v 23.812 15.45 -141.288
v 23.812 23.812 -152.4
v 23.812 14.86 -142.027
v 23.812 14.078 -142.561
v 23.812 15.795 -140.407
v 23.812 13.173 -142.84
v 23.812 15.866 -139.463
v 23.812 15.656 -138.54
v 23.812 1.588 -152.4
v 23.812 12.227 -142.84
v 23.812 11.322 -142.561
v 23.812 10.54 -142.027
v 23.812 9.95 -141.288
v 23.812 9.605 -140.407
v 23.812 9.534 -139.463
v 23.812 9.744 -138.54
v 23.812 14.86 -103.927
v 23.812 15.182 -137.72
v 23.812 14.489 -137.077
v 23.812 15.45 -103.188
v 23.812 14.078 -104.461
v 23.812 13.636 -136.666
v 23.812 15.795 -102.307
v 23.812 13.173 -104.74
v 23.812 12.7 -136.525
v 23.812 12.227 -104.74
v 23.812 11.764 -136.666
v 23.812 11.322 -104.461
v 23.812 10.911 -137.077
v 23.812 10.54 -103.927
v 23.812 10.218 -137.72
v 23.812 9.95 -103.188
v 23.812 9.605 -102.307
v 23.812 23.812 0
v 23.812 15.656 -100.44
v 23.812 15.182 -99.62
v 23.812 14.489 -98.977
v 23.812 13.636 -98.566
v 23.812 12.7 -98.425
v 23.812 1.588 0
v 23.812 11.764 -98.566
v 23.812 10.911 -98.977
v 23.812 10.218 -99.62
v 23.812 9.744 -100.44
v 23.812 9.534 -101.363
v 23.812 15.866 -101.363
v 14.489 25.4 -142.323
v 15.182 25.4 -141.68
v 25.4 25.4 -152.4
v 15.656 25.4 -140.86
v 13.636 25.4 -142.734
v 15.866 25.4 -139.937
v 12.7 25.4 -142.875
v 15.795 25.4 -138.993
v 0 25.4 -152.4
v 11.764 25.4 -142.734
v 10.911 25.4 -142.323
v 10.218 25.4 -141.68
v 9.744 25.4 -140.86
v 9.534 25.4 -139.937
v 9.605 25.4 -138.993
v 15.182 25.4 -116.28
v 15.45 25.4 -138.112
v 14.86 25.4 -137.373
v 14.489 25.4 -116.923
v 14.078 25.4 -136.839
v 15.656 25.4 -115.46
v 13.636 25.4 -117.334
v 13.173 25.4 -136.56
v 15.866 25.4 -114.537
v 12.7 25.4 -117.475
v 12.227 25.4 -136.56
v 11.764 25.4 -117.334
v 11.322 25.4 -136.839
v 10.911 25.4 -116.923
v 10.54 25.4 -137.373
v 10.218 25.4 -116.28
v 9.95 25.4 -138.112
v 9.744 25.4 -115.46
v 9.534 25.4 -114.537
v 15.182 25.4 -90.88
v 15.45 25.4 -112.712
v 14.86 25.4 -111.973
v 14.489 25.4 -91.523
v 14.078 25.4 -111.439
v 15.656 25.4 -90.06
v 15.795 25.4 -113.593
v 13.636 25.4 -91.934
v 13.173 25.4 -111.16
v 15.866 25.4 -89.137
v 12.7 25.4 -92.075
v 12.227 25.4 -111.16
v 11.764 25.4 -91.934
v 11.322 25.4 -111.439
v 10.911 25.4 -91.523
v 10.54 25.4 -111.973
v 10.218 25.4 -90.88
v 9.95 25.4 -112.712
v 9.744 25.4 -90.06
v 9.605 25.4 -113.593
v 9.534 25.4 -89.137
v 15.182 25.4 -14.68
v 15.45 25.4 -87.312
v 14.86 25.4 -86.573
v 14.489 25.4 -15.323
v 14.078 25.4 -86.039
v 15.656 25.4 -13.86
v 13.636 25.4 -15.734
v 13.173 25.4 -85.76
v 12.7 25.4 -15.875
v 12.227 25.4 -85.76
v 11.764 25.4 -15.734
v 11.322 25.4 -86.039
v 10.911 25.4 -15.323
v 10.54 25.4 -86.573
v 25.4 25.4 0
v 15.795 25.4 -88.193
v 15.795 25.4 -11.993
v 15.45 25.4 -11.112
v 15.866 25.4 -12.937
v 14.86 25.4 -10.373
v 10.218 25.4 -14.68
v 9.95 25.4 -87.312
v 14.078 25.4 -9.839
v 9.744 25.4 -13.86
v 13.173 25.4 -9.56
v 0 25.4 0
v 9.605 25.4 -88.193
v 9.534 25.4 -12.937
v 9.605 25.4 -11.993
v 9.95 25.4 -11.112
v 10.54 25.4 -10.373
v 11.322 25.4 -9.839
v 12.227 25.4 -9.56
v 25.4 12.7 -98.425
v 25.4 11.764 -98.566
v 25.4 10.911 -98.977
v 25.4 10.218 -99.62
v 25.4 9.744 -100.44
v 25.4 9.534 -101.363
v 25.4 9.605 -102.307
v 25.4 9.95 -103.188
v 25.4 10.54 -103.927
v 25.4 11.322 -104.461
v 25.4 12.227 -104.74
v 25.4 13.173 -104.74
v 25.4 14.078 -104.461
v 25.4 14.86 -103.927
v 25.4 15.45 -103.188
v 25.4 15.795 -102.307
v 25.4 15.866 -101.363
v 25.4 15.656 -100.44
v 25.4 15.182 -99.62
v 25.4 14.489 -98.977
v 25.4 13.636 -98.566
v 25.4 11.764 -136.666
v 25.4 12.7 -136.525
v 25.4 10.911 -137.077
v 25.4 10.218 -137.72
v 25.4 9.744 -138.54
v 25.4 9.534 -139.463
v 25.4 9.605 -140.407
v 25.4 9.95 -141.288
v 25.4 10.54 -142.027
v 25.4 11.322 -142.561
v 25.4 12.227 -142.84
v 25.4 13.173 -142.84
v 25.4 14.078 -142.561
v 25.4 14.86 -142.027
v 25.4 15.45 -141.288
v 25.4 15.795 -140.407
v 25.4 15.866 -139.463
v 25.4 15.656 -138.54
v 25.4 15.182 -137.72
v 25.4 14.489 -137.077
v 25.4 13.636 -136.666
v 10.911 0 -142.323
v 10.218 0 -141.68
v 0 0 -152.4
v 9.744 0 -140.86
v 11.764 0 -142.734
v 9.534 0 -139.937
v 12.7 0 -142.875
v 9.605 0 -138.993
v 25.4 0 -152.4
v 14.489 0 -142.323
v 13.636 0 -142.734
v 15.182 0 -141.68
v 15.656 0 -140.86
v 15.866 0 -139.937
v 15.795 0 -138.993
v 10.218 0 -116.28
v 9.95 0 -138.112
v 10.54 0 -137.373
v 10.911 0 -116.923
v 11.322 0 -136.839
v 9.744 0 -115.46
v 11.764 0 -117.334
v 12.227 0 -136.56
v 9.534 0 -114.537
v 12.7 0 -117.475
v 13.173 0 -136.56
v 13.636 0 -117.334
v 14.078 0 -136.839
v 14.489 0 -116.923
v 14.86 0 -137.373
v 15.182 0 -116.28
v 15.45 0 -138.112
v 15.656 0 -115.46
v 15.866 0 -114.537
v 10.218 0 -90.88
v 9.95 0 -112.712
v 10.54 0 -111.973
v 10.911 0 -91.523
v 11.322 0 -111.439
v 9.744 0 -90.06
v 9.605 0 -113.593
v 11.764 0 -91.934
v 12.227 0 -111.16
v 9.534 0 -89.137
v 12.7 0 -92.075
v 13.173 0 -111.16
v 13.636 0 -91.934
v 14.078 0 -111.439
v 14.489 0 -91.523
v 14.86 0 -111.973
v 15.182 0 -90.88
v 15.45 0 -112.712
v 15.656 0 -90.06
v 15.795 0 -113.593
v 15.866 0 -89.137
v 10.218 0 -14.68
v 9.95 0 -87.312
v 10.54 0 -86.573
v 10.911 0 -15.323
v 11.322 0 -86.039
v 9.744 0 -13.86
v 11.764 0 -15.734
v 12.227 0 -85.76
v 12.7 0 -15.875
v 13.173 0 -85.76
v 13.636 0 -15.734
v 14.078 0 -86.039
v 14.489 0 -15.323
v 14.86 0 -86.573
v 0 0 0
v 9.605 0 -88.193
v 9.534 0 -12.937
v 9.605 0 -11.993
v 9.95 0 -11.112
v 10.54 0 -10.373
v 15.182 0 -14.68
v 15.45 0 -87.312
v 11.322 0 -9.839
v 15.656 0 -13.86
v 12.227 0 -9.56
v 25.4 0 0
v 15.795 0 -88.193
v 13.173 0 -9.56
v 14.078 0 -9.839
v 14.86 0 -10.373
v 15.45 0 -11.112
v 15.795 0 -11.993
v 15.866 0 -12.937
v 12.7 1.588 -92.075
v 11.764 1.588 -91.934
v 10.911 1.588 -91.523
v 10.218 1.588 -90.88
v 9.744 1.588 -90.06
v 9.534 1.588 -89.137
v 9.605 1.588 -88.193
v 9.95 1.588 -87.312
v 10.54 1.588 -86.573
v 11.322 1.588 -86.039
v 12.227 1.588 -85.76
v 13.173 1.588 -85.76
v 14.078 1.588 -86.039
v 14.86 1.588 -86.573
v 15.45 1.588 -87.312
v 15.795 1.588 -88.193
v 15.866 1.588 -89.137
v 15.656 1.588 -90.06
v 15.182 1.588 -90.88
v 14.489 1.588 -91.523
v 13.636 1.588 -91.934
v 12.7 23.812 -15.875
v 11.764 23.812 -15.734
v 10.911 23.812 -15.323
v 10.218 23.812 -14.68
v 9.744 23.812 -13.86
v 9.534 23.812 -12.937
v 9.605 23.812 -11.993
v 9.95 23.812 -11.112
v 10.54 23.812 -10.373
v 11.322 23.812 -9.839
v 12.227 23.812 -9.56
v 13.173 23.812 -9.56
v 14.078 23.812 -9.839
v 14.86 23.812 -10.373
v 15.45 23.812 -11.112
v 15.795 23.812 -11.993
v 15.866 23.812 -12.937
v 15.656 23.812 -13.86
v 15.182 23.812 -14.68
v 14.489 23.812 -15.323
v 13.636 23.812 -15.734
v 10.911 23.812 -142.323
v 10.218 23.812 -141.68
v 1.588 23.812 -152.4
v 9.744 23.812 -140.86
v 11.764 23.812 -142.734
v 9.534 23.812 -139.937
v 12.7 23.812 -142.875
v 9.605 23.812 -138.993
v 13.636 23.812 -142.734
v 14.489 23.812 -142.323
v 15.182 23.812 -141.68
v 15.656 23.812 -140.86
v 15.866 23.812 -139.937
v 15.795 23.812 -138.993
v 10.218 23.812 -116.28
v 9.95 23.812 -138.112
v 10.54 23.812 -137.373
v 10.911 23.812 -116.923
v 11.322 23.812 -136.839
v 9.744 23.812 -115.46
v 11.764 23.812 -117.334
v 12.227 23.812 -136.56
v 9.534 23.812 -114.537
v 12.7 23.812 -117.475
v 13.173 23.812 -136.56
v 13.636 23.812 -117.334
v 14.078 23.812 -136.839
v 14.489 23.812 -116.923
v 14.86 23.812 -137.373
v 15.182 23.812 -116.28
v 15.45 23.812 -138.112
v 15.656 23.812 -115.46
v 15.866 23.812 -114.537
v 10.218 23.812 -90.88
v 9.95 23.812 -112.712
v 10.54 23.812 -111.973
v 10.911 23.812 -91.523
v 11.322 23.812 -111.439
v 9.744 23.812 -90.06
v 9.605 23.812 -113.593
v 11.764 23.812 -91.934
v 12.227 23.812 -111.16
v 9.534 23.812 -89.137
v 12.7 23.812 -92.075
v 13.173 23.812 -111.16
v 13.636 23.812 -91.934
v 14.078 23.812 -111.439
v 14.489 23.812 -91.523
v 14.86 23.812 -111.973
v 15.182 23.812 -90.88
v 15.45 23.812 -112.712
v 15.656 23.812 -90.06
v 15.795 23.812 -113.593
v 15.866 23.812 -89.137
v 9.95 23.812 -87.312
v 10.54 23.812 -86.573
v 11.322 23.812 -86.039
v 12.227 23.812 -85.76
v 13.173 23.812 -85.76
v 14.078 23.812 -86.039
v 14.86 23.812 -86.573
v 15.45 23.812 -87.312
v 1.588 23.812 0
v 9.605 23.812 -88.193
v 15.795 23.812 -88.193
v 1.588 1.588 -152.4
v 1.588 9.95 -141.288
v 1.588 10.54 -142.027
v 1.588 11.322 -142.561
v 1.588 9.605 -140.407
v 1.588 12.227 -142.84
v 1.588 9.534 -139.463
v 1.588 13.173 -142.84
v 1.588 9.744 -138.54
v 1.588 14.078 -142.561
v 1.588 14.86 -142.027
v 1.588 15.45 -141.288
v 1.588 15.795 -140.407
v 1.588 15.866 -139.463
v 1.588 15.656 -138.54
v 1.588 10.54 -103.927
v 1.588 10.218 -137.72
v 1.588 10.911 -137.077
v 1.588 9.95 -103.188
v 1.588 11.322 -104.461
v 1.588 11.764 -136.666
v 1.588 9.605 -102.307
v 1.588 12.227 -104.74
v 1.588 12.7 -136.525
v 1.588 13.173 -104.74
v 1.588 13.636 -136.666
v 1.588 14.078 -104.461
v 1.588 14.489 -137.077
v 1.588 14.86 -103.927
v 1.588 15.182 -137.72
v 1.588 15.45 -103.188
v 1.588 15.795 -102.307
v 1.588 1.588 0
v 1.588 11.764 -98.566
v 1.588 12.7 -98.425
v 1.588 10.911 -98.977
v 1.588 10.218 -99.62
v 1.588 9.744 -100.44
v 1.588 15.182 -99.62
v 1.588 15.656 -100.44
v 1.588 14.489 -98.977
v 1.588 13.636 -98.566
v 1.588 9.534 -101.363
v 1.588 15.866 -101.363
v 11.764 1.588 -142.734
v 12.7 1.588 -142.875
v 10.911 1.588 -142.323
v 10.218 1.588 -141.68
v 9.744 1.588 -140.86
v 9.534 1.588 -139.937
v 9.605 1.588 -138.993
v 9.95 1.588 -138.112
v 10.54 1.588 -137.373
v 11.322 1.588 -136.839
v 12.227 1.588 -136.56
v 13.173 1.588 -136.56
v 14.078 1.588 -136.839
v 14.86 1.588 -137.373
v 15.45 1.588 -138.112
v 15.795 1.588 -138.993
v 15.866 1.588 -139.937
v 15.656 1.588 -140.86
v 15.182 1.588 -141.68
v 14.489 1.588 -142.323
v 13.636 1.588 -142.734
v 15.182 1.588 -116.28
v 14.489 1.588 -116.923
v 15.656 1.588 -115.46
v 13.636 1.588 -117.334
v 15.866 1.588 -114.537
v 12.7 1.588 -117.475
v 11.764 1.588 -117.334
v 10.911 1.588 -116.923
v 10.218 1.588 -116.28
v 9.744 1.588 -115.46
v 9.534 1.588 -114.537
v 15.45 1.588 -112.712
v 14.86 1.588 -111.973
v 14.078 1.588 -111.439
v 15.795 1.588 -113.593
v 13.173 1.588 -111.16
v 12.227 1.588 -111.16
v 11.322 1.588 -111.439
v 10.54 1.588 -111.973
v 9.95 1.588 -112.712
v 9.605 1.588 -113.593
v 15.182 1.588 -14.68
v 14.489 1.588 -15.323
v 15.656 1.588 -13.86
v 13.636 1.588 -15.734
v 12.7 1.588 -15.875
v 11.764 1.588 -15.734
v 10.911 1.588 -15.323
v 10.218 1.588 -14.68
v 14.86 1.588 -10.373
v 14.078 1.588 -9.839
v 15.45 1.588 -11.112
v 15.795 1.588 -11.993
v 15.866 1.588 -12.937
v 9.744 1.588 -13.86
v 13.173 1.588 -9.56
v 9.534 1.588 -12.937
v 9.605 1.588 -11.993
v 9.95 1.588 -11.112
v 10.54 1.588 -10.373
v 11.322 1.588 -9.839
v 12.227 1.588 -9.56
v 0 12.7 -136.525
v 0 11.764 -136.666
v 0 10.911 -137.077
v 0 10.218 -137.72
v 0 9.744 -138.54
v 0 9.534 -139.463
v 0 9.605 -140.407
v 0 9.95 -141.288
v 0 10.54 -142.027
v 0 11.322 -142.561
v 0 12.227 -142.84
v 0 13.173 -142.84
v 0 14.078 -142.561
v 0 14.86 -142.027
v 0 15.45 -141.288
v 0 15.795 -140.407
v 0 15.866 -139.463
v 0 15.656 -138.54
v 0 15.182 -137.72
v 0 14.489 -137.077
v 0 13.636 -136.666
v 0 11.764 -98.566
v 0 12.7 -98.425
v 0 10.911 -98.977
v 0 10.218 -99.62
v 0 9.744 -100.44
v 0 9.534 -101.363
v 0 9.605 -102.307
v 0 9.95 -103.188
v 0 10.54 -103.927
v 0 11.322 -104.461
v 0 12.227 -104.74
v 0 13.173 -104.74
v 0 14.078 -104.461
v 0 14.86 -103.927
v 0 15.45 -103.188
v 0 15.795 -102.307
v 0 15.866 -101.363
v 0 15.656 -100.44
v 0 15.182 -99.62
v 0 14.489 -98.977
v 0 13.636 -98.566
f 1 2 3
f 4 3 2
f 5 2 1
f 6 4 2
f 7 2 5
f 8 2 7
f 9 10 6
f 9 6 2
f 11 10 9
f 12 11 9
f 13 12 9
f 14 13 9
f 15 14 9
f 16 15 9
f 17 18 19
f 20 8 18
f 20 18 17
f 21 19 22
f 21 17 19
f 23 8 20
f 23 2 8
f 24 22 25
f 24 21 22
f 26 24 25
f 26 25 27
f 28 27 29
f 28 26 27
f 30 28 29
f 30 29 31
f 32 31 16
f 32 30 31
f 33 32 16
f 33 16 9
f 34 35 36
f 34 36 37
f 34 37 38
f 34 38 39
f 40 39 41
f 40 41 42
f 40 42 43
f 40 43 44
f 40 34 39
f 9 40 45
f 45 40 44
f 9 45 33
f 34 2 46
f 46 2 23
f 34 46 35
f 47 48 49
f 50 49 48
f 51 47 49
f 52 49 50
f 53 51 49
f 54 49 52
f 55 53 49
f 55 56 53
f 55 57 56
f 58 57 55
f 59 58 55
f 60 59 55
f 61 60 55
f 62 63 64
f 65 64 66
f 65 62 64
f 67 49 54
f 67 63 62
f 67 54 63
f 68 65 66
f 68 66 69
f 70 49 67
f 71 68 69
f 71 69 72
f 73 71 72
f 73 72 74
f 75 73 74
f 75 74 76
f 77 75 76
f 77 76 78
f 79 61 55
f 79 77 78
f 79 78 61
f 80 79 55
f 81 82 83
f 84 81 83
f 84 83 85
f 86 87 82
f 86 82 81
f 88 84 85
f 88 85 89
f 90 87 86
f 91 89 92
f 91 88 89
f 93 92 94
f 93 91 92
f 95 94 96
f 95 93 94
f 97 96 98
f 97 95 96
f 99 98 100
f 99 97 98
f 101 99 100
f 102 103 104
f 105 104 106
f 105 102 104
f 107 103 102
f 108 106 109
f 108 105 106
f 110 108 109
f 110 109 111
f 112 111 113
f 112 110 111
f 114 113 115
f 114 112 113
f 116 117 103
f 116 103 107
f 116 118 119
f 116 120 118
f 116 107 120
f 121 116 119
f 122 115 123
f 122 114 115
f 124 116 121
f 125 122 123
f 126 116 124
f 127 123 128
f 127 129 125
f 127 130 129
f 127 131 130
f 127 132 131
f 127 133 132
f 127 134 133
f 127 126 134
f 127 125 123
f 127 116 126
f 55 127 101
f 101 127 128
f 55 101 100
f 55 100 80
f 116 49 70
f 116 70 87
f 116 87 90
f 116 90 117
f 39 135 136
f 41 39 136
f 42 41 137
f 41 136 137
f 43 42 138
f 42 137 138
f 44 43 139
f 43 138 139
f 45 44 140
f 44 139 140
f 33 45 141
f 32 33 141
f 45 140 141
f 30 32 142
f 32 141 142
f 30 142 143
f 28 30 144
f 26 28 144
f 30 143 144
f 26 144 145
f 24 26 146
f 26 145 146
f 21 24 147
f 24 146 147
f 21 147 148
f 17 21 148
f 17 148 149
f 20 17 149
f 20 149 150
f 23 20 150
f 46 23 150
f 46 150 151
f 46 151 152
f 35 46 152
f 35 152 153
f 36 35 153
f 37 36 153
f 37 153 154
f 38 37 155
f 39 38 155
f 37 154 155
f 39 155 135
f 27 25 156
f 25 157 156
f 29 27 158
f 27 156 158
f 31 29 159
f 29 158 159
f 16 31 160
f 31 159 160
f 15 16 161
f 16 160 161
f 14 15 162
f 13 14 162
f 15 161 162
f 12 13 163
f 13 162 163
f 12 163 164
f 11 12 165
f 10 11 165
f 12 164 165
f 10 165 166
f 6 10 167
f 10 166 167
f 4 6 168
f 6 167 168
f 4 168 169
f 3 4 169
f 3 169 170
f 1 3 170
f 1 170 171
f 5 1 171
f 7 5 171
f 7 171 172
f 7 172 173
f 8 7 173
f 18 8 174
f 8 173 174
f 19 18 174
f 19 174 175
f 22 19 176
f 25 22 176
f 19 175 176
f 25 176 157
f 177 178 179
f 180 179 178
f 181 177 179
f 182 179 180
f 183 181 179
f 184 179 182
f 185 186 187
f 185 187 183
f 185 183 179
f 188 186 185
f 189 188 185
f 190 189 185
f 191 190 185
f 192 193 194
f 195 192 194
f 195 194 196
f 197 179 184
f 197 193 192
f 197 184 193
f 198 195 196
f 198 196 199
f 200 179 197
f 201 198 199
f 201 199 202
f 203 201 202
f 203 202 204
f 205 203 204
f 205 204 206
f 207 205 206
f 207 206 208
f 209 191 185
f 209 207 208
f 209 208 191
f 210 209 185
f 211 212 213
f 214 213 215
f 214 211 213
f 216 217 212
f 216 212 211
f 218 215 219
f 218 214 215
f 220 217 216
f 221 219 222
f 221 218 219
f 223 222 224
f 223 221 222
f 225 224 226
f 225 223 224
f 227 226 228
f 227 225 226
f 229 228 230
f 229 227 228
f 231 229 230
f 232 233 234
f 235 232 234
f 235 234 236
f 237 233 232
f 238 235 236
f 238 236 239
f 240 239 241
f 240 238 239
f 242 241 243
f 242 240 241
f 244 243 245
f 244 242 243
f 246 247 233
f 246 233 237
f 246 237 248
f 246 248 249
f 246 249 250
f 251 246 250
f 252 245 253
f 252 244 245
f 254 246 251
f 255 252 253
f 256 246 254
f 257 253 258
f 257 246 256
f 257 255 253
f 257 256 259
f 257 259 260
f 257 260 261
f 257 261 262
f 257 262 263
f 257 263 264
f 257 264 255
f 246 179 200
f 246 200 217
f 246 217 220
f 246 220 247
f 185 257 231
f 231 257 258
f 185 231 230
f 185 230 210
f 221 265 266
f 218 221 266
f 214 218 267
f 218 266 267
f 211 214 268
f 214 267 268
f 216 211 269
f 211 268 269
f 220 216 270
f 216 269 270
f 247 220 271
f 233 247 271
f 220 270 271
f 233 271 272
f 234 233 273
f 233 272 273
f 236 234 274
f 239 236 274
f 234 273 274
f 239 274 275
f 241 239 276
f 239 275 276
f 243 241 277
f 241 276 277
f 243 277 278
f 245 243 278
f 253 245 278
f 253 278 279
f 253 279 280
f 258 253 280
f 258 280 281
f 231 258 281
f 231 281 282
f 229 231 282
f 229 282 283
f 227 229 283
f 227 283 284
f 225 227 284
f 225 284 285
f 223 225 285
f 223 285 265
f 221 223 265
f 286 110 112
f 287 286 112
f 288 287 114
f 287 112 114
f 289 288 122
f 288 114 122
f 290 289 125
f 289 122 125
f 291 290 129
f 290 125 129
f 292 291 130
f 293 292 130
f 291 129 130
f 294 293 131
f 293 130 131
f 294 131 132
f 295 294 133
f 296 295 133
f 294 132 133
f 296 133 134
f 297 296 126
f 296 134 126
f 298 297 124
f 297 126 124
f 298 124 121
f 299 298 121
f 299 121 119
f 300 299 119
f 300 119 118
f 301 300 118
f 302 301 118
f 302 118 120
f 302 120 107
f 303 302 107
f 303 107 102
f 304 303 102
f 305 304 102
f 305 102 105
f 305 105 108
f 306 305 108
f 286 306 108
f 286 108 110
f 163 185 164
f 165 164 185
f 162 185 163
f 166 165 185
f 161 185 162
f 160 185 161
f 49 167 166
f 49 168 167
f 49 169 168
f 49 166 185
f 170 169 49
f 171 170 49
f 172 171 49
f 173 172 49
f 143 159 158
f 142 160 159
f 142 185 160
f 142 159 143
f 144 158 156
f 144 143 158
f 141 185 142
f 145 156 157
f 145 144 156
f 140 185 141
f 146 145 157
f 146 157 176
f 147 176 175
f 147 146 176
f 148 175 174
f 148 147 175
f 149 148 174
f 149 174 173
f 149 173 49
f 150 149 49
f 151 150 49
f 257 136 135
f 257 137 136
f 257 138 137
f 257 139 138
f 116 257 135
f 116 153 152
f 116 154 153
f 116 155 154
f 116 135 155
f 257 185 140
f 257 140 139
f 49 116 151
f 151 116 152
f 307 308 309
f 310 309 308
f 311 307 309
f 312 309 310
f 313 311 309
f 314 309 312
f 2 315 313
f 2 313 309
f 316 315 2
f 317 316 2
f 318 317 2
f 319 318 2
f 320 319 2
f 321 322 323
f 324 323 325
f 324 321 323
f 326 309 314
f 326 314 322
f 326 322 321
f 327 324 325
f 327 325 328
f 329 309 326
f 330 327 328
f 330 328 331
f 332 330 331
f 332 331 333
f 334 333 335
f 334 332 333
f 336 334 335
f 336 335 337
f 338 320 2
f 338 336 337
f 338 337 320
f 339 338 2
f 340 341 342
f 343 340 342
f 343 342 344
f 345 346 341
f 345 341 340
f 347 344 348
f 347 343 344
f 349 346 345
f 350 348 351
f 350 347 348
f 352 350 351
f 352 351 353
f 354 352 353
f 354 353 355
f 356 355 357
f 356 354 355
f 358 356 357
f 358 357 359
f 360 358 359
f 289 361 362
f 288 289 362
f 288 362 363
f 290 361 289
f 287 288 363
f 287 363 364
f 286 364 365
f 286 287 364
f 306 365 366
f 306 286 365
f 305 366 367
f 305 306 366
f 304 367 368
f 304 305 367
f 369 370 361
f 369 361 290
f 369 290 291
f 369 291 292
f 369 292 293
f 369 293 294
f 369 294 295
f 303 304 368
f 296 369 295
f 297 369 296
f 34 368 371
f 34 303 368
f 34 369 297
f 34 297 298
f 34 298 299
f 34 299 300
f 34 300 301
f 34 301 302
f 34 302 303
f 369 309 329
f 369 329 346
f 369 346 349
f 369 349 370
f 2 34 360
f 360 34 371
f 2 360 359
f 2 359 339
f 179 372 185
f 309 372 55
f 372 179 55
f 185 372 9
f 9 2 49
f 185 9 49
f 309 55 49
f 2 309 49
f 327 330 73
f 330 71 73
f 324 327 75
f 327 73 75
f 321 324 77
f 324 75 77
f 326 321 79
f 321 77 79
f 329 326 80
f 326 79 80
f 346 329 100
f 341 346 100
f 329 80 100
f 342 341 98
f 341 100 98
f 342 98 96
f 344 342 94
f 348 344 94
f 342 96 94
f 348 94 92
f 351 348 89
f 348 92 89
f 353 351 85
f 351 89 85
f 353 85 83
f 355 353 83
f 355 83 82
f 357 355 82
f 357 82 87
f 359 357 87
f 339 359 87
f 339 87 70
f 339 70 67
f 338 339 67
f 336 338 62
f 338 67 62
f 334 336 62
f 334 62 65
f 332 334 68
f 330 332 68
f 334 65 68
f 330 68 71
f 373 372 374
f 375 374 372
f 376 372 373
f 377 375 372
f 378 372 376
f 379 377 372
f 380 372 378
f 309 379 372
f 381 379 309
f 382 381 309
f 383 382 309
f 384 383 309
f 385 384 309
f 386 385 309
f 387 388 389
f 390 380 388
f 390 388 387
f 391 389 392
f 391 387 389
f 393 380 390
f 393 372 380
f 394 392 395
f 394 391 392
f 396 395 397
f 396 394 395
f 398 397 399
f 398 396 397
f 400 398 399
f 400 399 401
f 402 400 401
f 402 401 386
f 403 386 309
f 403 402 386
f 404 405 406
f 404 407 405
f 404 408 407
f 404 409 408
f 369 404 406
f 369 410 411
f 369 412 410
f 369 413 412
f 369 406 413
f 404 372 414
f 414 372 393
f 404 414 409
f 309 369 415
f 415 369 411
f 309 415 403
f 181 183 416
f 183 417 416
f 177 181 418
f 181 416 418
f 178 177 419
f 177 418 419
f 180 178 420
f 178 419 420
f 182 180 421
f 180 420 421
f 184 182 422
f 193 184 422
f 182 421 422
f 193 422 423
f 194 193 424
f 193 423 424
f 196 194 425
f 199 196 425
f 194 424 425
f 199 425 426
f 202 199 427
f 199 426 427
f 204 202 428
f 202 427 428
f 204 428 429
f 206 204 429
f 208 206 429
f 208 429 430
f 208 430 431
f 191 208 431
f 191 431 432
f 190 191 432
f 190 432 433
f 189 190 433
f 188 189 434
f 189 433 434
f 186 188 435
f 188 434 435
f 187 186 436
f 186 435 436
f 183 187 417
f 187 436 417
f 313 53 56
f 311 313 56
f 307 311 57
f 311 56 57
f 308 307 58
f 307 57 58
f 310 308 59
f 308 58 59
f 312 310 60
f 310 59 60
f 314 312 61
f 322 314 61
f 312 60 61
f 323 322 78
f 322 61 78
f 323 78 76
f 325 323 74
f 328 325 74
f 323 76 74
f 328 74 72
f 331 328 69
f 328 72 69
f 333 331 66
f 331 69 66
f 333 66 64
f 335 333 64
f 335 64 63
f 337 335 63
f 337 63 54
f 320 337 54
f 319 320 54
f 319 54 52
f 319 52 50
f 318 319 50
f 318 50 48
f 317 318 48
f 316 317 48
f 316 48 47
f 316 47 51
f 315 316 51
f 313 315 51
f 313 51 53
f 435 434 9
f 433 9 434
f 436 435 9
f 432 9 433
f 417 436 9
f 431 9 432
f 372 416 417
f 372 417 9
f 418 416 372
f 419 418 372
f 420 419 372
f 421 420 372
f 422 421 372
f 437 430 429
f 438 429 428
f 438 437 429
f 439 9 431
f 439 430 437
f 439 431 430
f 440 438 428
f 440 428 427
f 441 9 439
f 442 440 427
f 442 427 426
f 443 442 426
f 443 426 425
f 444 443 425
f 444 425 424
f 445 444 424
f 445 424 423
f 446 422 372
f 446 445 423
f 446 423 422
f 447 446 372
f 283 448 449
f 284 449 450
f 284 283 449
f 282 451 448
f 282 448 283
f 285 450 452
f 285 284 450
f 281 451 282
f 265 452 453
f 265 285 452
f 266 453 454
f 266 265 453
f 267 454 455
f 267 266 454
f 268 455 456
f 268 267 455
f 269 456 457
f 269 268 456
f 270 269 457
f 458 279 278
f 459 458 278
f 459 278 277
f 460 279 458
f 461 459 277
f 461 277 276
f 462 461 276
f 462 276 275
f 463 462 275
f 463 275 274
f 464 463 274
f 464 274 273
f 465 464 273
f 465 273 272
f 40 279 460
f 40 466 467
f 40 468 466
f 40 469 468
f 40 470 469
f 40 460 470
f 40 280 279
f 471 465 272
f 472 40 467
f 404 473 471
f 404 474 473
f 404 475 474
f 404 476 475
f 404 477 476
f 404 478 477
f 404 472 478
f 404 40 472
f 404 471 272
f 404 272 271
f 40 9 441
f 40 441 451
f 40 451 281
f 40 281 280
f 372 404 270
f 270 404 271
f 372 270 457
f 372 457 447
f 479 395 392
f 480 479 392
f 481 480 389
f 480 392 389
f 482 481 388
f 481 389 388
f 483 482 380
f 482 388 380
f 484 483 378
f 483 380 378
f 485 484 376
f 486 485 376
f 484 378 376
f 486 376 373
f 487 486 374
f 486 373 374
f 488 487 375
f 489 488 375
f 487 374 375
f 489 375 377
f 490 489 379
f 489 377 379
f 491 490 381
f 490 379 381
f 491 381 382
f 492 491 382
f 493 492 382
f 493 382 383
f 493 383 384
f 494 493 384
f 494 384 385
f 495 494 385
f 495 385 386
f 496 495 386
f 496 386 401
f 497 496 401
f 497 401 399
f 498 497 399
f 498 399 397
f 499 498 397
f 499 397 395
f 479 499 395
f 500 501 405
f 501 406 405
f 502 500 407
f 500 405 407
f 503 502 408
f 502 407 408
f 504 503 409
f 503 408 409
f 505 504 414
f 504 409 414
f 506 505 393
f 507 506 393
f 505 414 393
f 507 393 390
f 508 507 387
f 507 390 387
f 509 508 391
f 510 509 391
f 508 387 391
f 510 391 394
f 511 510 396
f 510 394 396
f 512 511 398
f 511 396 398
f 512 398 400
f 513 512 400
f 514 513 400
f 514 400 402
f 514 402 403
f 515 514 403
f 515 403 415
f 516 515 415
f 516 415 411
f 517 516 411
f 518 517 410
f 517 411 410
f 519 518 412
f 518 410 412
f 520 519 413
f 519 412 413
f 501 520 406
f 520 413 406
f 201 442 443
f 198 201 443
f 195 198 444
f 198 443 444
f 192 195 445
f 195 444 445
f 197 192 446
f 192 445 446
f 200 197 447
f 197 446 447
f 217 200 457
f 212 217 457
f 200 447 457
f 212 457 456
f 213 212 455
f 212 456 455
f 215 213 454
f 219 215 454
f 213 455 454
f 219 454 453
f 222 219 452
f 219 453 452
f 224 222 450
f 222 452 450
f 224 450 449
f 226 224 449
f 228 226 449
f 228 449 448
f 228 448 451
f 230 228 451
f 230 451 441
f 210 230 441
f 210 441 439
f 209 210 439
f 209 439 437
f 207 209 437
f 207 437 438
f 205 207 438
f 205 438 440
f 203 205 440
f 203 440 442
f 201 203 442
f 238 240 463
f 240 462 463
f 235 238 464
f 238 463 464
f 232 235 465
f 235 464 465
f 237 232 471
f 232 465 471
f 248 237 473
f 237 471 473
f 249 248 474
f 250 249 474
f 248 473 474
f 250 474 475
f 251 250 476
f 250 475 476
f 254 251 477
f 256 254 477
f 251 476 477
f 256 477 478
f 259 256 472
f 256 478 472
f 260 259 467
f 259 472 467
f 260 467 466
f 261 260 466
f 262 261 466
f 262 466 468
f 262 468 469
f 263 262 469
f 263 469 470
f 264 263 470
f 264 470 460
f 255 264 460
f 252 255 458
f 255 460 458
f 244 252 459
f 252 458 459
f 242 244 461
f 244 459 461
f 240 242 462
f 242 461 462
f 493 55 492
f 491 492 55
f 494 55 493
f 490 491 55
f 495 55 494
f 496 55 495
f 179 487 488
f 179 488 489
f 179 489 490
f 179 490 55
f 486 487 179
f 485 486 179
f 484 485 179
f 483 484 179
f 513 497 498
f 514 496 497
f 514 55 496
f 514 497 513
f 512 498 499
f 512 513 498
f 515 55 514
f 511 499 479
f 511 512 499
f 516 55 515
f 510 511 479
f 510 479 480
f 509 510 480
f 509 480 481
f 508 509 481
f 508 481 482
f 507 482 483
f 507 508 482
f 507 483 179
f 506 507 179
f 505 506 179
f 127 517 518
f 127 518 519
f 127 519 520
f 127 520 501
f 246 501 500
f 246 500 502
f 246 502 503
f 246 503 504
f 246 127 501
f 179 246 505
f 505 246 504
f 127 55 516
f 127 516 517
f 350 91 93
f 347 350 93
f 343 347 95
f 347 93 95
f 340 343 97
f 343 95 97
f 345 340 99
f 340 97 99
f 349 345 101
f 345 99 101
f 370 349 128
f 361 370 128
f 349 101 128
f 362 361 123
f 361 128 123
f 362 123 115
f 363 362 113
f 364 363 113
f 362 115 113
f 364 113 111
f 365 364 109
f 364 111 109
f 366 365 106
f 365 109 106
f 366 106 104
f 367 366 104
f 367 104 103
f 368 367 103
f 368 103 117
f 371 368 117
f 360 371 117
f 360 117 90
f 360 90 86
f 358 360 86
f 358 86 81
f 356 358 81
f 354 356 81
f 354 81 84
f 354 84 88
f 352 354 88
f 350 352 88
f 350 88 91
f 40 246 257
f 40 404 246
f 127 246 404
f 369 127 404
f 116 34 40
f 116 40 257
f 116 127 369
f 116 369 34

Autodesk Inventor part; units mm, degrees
ref_plane "YZ Plane" through (0, 0, 0) normal (1, 0, 0) x (0, 1, 0)
ref_plane "XZ Plane" through (0, 0, 0) normal (0, 1, 0) x (-1, 0, 0)
ref_plane "XY Plane" through (0, 0, 0) normal (0, 0, 1) x (1, 0, 0)
sketch "Sketch1" plane through (0, 0, 0) normal (0, 0, 1) x (1, 0, 0)
  line L0 (0, 0) -> (25.4, 0)
  line L1 (25.4, 0) -> (25.4, 25.4)
  line L2 (25.4, 25.4) -> (0, 25.4)
  line L3 (0, 25.4) -> (0, 0)
  line L4 (1.5875, 23.8125) -> (23.8125, 23.8125)
  line L5 (23.8125, 23.8125) -> (23.8125, 1.5875)
  line L6 (23.8125, 1.5875) -> (1.5875, 1.5875)
  line L7 (1.5875, 1.5875) -> (1.5875, 23.8125)
  dimension "d0" = 25.4
  dimension "d1" = 25.4
  dimension "d2" = 1.5875
extrude "Extrusion1" add sketch "Sketch1" against normal blind 152.4
sketch "Sketch2" plane through (0, 0, 0) normal (0, -1, 0) x (1, 0, 0)
  line L0 (0, -152.4) -> (25.4, -152.4) projected
  line L1 (0, 0) -> (25.4, 0) projected
  point P0 (12.7, -12.7)
  point P1 (12.7, -139.7)
  point P2 (12.7, -114.3)
  point P3 (12.7, -88.9)
  point P4 (12.7, -152.4)
  dimension "d5" = 25.4
  dimension "d6" = 25.4
  dimension "d7" = 12.7
  dimension "d8" = 12.7
hole "Hole1" at (12.7, 0, -12.7) at (12.7, 0, -139.7) at (12.7, 0, -114.3) at (12.7, 0, -88.9) direction (0, 1, 0) diameter 6.35 depth 25.4 tip angle 118
sketch "Sketch3" plane through (0, 0, 0) normal (-1, 0, 0) x (0, 0, 1)
  line L0 (-152.4, 25.4) -> (-152.4, 0) projected
  point P0 (-139.7, 12.7)
  point P1 (-101.6, 12.7)
  dimension "d25" = 12.7
  dimension "d27" = 38.1
hole "Hole2" at (0, 12.7, -139.7) at (0, 12.7, -101.6) direction (1, 0, 0) diameter 6.35 depth 25.4 tip angle 118
properties part number "1tube_6"
